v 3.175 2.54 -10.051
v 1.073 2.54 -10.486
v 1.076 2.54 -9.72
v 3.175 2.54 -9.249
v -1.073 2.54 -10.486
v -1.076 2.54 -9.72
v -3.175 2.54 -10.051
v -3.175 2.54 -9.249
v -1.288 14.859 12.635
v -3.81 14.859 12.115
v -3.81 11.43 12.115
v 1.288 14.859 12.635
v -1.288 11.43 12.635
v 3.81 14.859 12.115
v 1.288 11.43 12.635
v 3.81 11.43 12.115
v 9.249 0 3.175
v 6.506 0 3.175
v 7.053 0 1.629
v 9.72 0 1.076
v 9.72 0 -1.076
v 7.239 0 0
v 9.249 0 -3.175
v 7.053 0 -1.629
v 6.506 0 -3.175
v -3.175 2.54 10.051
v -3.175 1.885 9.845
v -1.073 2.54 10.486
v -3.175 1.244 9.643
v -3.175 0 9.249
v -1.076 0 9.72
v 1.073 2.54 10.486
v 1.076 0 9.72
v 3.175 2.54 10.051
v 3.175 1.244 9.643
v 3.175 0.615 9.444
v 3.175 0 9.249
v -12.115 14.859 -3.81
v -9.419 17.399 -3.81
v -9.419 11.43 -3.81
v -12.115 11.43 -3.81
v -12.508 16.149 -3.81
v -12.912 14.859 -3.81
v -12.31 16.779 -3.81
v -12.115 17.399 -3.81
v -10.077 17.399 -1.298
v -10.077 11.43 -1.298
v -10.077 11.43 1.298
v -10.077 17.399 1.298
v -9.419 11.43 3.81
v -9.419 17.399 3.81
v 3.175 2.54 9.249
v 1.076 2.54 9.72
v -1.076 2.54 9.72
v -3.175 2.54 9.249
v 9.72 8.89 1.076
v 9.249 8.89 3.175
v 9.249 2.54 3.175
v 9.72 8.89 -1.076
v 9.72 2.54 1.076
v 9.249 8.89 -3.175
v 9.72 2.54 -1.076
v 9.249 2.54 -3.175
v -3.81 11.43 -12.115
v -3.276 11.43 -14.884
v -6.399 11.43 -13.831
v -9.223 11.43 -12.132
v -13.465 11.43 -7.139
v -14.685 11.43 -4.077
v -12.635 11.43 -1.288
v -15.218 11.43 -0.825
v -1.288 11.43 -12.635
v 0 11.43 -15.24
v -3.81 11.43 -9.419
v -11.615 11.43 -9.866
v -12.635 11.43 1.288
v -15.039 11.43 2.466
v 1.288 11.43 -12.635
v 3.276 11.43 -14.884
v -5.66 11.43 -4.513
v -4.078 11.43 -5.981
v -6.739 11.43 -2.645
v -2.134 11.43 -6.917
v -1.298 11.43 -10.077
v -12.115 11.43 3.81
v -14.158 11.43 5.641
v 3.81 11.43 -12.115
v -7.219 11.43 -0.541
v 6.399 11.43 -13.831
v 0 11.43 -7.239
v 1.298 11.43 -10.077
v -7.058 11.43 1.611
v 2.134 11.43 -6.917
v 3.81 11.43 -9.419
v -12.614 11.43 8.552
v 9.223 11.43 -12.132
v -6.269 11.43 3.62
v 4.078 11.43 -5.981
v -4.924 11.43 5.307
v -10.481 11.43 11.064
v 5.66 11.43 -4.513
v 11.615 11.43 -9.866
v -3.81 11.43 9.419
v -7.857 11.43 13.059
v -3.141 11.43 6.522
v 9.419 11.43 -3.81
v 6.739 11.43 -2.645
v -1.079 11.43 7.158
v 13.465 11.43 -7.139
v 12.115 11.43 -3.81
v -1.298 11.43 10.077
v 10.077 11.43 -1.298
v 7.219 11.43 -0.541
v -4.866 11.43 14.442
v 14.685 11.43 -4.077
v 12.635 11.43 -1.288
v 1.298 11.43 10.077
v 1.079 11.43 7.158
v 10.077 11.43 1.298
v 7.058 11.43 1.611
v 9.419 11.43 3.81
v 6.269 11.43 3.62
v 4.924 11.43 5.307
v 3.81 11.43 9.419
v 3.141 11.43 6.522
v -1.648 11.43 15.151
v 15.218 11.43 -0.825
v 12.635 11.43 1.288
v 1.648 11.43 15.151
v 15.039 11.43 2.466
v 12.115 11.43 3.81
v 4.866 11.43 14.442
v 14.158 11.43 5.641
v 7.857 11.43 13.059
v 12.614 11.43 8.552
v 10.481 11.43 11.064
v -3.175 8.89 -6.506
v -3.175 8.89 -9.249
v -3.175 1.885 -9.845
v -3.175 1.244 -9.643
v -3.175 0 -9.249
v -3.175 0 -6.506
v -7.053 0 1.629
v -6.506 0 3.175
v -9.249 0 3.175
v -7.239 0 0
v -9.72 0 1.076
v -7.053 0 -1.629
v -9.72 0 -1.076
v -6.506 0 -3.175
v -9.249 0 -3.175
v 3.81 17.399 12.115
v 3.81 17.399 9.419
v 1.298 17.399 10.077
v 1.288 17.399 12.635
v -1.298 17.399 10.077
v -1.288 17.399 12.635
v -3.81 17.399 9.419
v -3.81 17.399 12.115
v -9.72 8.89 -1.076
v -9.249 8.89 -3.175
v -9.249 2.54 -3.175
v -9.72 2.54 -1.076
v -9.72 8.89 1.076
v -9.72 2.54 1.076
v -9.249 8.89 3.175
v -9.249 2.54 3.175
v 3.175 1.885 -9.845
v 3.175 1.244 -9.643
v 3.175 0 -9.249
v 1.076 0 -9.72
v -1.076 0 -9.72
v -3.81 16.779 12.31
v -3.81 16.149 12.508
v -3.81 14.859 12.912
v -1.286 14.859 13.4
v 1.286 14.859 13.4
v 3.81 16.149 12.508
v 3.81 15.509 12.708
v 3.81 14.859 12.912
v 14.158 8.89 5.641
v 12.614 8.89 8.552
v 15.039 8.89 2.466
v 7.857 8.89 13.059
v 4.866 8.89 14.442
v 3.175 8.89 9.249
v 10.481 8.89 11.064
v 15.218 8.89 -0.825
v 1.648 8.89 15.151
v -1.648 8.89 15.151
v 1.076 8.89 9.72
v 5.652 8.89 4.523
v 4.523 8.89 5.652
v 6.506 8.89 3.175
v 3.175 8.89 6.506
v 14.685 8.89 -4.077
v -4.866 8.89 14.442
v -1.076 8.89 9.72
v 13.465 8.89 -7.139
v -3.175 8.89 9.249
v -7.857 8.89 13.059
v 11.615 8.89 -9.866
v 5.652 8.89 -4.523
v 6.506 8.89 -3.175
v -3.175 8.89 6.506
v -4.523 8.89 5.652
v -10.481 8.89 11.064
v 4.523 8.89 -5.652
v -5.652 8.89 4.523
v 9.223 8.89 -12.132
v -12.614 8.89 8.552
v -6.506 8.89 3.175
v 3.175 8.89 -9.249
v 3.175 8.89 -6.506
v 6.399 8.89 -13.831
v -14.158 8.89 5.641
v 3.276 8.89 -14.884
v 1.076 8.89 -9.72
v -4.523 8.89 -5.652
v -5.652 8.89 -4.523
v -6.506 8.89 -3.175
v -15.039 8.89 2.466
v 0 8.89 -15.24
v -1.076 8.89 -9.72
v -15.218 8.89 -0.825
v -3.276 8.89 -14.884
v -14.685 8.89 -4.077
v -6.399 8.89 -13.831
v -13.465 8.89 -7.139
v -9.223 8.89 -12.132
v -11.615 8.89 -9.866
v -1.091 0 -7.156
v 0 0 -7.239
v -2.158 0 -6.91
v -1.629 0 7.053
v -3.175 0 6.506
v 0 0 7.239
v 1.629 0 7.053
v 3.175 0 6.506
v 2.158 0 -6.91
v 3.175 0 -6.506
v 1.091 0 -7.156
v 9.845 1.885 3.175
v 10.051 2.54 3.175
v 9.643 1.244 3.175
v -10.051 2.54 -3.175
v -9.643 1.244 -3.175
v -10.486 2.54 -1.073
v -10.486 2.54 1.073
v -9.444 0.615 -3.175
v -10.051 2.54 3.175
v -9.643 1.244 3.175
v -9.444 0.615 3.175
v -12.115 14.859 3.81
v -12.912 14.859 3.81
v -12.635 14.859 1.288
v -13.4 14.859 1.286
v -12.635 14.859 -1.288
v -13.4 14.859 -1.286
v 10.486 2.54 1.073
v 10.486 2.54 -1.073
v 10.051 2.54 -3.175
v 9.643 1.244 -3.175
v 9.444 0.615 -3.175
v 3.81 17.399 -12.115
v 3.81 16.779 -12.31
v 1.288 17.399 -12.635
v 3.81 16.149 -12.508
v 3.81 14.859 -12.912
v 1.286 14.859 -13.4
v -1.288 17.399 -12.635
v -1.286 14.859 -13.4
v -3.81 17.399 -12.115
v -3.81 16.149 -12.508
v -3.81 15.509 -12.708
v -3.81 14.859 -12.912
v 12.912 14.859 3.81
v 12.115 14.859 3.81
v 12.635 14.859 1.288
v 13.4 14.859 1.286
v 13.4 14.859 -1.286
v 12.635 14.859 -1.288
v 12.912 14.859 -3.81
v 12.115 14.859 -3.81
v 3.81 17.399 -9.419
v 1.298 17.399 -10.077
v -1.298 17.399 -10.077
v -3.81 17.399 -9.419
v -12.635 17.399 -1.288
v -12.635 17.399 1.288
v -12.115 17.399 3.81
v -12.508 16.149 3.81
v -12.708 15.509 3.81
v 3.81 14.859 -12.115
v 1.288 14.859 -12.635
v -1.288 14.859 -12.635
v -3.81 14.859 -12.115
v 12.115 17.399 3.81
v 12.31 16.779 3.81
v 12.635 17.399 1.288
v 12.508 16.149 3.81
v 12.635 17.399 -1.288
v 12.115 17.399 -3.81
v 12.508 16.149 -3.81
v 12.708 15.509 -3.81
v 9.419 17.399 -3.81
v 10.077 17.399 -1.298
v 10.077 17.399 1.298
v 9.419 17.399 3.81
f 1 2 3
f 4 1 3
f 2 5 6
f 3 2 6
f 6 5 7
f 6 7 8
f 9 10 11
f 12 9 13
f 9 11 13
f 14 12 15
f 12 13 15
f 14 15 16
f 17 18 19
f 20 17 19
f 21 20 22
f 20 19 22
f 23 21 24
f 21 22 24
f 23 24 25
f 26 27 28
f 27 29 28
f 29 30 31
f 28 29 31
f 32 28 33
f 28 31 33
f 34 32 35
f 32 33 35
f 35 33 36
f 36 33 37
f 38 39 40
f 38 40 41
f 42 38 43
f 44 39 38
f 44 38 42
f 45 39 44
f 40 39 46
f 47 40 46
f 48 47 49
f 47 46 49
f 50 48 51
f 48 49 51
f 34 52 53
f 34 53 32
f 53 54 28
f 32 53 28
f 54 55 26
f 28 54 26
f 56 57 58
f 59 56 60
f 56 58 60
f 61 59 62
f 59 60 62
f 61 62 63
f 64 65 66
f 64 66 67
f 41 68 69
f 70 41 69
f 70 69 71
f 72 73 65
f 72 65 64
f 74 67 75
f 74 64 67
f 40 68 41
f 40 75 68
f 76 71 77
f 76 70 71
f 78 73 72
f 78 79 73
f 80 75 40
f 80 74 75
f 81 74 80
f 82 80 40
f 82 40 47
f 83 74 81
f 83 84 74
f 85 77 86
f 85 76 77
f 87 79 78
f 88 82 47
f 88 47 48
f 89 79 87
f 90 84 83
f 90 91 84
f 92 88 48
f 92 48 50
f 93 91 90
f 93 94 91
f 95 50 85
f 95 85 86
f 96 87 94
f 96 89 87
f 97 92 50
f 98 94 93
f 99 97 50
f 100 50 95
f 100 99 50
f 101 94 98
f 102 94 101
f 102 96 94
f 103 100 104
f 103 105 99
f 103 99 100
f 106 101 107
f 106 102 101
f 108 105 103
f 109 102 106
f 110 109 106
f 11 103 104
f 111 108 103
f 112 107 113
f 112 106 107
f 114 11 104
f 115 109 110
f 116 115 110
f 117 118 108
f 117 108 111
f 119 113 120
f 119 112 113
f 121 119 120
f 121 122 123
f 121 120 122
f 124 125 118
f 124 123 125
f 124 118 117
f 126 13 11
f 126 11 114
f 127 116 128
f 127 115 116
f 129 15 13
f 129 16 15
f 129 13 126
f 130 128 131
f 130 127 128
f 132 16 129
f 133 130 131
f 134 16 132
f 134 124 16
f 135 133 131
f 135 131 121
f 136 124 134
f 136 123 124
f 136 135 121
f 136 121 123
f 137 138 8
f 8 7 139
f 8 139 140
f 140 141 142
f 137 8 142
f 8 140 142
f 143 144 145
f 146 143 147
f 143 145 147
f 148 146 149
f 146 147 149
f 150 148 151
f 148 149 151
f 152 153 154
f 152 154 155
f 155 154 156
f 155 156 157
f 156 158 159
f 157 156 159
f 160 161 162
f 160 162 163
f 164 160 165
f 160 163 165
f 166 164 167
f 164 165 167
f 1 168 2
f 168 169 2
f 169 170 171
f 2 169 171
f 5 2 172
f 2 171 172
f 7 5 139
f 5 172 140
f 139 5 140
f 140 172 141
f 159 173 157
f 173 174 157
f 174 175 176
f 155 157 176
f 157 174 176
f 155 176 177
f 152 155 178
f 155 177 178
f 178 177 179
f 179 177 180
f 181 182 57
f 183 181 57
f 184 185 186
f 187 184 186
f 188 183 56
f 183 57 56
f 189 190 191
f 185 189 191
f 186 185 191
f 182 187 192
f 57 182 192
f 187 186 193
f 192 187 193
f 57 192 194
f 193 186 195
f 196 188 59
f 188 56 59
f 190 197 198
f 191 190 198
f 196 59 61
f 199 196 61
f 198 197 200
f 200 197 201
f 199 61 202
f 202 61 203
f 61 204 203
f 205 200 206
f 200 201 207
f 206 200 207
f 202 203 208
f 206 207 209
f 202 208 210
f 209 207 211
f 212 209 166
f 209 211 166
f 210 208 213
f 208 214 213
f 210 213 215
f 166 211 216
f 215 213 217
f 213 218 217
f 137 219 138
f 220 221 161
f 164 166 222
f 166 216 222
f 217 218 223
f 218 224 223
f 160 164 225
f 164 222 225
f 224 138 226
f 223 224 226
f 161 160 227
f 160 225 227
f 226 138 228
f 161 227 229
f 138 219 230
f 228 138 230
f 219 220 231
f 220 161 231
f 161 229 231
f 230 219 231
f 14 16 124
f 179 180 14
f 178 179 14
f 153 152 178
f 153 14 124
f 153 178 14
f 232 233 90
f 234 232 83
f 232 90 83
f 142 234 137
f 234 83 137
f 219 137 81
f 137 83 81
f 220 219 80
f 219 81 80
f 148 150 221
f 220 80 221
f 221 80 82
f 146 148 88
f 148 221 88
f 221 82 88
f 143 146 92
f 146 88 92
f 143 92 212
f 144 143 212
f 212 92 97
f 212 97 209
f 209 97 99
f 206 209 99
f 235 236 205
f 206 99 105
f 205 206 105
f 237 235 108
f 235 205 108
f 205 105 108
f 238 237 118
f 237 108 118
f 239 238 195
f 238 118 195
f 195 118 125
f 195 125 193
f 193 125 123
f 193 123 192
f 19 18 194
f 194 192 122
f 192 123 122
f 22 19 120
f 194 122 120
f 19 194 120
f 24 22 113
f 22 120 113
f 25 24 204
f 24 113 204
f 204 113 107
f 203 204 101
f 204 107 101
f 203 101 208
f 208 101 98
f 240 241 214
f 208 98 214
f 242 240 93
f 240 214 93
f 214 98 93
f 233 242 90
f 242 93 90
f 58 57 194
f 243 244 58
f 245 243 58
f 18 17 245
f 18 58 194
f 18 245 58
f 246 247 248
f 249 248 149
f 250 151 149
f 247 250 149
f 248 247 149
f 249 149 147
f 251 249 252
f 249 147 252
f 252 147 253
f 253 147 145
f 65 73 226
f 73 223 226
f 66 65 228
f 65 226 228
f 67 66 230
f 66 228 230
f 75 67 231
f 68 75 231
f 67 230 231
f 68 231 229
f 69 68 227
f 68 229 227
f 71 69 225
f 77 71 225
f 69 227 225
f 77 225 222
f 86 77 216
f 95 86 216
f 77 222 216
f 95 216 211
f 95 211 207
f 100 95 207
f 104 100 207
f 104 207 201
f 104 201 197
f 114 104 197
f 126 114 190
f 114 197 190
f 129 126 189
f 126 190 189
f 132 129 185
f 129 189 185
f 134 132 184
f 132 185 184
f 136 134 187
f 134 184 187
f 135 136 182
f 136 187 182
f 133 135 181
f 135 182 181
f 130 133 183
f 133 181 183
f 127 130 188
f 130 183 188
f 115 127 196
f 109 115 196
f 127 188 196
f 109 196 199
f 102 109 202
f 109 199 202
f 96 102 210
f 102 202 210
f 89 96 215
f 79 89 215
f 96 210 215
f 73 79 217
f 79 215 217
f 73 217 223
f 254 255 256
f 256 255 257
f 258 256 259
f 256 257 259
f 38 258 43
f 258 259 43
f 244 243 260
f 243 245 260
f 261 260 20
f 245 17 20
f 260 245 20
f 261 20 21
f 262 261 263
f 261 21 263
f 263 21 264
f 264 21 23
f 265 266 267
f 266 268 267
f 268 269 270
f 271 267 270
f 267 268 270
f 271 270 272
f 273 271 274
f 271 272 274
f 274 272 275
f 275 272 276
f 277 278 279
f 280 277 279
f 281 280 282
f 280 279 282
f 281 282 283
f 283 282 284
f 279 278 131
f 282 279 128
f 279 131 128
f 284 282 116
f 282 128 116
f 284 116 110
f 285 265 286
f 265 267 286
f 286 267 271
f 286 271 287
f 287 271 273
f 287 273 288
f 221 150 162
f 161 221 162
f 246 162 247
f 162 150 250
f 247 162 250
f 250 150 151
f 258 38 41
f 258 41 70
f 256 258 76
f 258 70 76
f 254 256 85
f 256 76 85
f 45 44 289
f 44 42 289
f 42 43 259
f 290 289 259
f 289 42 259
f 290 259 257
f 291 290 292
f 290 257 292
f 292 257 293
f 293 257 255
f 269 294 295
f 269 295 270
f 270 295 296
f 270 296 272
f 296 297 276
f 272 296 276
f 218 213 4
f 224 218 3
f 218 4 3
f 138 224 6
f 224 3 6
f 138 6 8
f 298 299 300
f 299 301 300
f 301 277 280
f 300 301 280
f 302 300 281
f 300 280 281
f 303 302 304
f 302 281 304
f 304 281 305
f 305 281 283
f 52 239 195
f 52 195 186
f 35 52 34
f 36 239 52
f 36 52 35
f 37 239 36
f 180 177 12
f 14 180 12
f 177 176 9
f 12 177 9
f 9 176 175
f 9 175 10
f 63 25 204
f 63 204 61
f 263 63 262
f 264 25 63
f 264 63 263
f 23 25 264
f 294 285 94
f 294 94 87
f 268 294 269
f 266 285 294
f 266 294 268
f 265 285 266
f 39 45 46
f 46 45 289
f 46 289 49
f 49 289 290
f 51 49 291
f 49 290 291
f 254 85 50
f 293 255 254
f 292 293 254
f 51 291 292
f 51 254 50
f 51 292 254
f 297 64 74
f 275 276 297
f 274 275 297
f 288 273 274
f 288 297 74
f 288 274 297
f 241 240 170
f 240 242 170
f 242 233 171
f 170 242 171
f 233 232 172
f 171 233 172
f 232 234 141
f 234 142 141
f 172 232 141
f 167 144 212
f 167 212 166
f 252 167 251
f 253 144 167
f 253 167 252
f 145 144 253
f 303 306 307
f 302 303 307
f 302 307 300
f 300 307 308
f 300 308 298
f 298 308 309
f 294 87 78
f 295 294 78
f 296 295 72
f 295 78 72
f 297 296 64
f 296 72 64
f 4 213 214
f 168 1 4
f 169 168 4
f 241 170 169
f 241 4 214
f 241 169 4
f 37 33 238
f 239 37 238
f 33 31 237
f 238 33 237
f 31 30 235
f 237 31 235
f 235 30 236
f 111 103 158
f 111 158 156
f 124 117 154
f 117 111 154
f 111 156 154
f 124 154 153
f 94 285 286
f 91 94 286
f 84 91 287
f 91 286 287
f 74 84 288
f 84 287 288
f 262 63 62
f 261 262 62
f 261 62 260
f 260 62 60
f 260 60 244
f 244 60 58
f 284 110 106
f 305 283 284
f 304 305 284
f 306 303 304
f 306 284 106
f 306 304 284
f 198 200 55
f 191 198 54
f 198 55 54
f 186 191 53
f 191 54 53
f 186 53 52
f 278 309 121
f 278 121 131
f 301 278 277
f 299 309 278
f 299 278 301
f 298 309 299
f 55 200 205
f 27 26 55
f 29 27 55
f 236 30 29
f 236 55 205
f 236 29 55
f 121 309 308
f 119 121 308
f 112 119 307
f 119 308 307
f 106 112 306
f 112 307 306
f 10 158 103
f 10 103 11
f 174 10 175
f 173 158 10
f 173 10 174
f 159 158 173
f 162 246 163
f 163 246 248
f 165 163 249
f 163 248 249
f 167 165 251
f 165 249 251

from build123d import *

# Parameters (mm, degrees)
CUT_EXTRUDE1_REACH = 29.699
CUT_EXTRUDE2_REACH = 29.699


with BuildPart() as part:
    # Sketch1 → Revolve1 (revolve)
    with BuildSketch(Plane.XY, mode=Mode.PRIVATE) as revolve1_sk:
        Polygon((12.7, 17.399), (13.462, 14.859), (12.7, 14.859), (12.7, 11.43), (15.24, 11.43), (15.24, 8.89), (9.779, 8.89), (9.779, 2.54), (10.541, 2.54), (9.779, 0), (7.239, 0), (7.239, 11.43), (10.16, 11.43), (10.16, 17.399), align=None)
    revolve(revolve1_sk.sketch.rotate(Axis((0, 0, 0), (0, 1, 0)), 90), axis=Axis((0, 0, 0), (0, 1, 0)))

    # Cut-Extrude1: up to this face of the body (flat: up to its plane)
    cut_extrude1_end = Plane(part.part.faces().sort_by_distance((0, 11.43, 13.131052294))[0])
    # Sketch2 → Cut-Extrude1 (cut, up to the picked face)
    with BuildSketch(Plane(origin=(0, 17.399, 0), x_dir=(1, 0, 0), z_dir=(0, 1, 0)), mode=Mode.PRIVATE) as cut_extrude1_sk1:
        with BuildLine():
            Line((-9.418572079, 3.81), (-12.911597268, 3.81))
            ThreePointArc((-12.911597268, 3.81), (-9.519071488, 9.519071488), (-3.81, 12.911597268))
            Line((-3.81, 12.911597268), (-3.81, 9.418572079))
            ThreePointArc((-3.81, 9.418572079), (-7.184204897, 7.184204897), (-9.418572079, 3.81))
        make_face()
    cut_extrude1_tool1 = split(extrude(cut_extrude1_sk1.sketch, amount=-CUT_EXTRUDE1_REACH, mode=Mode.PRIVATE), bisect_by=cut_extrude1_end, keep=Keep.BOTH, mode=Mode.PRIVATE)
    # Sketch2 → Cut-Extrude1 (cut, up to the picked face)
    with BuildSketch(Plane(origin=(0, 17.399, 0), x_dir=(1, 0, 0), z_dir=(0, 1, 0)), mode=Mode.PRIVATE) as cut_extrude1_sk2:
        with BuildLine():
            Line((-12.911597268, -3.81), (-9.418572079, -3.81))
            ThreePointArc((-9.418572079, -3.81), (-7.184204897, -7.184204897), (-3.81, -9.418572079))
            Line((-3.81, -9.418572079), (-3.81, -12.911597268))
            ThreePointArc((-3.81, -12.911597268), (-9.519071488, -9.519071488), (-12.911597268, -3.81))
        make_face()
    cut_extrude1_tool2 = split(extrude(cut_extrude1_sk2.sketch, amount=-CUT_EXTRUDE1_REACH, mode=Mode.PRIVATE), bisect_by=cut_extrude1_end, keep=Keep.BOTH, mode=Mode.PRIVATE)
    # Sketch2 → Cut-Extrude1 (cut, up to the picked face)
    with BuildSketch(Plane(origin=(0, 17.399, 0), x_dir=(1, 0, 0), z_dir=(0, 1, 0)), mode=Mode.PRIVATE) as cut_extrude1_sk3:
        with BuildLine():
            Line((3.81, 9.418572079), (3.81, 12.911597268))
            ThreePointArc((3.81, 12.911597268), (9.519071488, 9.519071488), (12.911597268, 3.81))
            Line((12.911597268, 3.81), (9.418572079, 3.81))
            ThreePointArc((9.418572079, 3.81), (7.184204897, 7.184204897), (3.81, 9.418572079))
        make_face()
    cut_extrude1_tool3 = split(extrude(cut_extrude1_sk3.sketch, amount=-CUT_EXTRUDE1_REACH, mode=Mode.PRIVATE), bisect_by=cut_extrude1_end, keep=Keep.BOTH, mode=Mode.PRIVATE)
    # Sketch2 → Cut-Extrude1 (cut, up to the picked face)
    with BuildSketch(Plane(origin=(0, 17.399, 0), x_dir=(1, 0, 0), z_dir=(0, 1, 0)), mode=Mode.PRIVATE) as cut_extrude1_sk4:
        with BuildLine():
            Line((9.418572079, -3.81), (12.911597268, -3.81))
            ThreePointArc((12.911597268, -3.81), (9.519071488, -9.519071488), (3.81, -12.911597268))
            Line((3.81, -12.911597268), (3.81, -9.418572079))
            ThreePointArc((3.81, -9.418572079), (7.184204897, -7.184204897), (9.418572079, -3.81))
        make_face()
    cut_extrude1_tool4 = split(extrude(cut_extrude1_sk4.sketch, amount=-CUT_EXTRUDE1_REACH, mode=Mode.PRIVATE), bisect_by=cut_extrude1_end, keep=Keep.BOTH, mode=Mode.PRIVATE)
    add(cut_extrude1_tool1.solids().sort_by(Axis((-8.150135, 17.399, -8.150135), (0, -1, 0)))[0], mode=Mode.SUBTRACT)
    add(cut_extrude1_tool2.solids().sort_by(Axis((-8.150135, 17.399, 8.150135), (0, -1, 0)))[0], mode=Mode.SUBTRACT)
    add(cut_extrude1_tool3.solids().sort_by(Axis((8.150135, 17.399, -8.150135), (0, -1, 0)))[0], mode=Mode.SUBTRACT)
    add(cut_extrude1_tool4.solids().sort_by(Axis((8.150135, 17.399, 8.150135), (0, -1, 0)))[0], mode=Mode.SUBTRACT)

    # Cut-Extrude2: up to this face of the body (flat: up to its plane)
    cut_extrude2_end = Plane(part.part.faces().sort_by_distance((0, 8.89, 14.808947706))[0])
    # Sketch3 → Cut-Extrude2 (cut, up to the picked face)
    with BuildSketch(Plane.XZ, mode=Mode.PRIVATE) as cut_extrude2_sk1:
        with BuildLine():
            Line((-6.505574225, 3.175), (-10.05147034, 3.175))
            ThreePointArc((-10.05147034, 3.175), (-7.45361258, 7.45361258), (-3.175, 10.05147034))
            Line((-3.175, 10.05147034), (-3.175, 6.505574225))
            ThreePointArc((-3.175, 6.505574225), (-5.118745989, 5.118745989), (-6.505574225, 3.175))
        make_face()
    cut_extrude2_tool1 = split(extrude(cut_extrude2_sk1.sketch, amount=-CUT_EXTRUDE2_REACH, mode=Mode.PRIVATE), bisect_by=cut_extrude2_end, keep=Keep.BOTH, mode=Mode.PRIVATE)
    # Sketch3 → Cut-Extrude2 (cut, up to the picked face)
    with BuildSketch(Plane.XZ, mode=Mode.PRIVATE) as cut_extrude2_sk2:
        with BuildLine():
            Line((-6.505574225, -3.175), (-10.05147034, -3.175))
            ThreePointArc((-10.05147034, -3.175), (-7.45361258, -7.45361258), (-3.175, -10.05147034))
            Line((-3.175, -10.05147034), (-3.175, -6.505574225))
            ThreePointArc((-3.175, -6.505574225), (-5.118745989, -5.118745989), (-6.505574225, -3.175))
        make_face()
    cut_extrude2_tool2 = split(extrude(cut_extrude2_sk2.sketch, amount=-CUT_EXTRUDE2_REACH, mode=Mode.PRIVATE), bisect_by=cut_extrude2_end, keep=Keep.BOTH, mode=Mode.PRIVATE)
    # Sketch3 → Cut-Extrude2 (cut, up to the picked face)
    with BuildSketch(Plane.XZ, mode=Mode.PRIVATE) as cut_extrude2_sk3:
        with BuildLine():
            Line((3.175, 6.505574225), (3.175, 10.05147034))
            ThreePointArc((3.175, 10.05147034), (7.45361258, 7.45361258), (10.05147034, 3.175))
            Line((10.05147034, 3.175), (6.505574225, 3.175))
            ThreePointArc((6.505574225, 3.175), (5.118745989, 5.118745989), (3.175, 6.505574225))
        make_face()
    cut_extrude2_tool3 = split(extrude(cut_extrude2_sk3.sketch, amount=-CUT_EXTRUDE2_REACH, mode=Mode.PRIVATE), bisect_by=cut_extrude2_end, keep=Keep.BOTH, mode=Mode.PRIVATE)
    # Sketch3 → Cut-Extrude2 (cut, up to the picked face)
    with BuildSketch(Plane.XZ, mode=Mode.PRIVATE) as cut_extrude2_sk4:
        with BuildLine():
            Line((6.505574225, -3.175), (10.05147034, -3.175))
            ThreePointArc((10.05147034, -3.175), (7.45361258, -7.45361258), (3.175, -10.05147034))
            Line((3.175, -10.05147034), (3.175, -6.505574225))
            ThreePointArc((3.175, -6.505574225), (5.118745989, -5.118745989), (6.505574225, -3.175))
        make_face()
    cut_extrude2_tool4 = split(extrude(cut_extrude2_sk4.sketch, amount=-CUT_EXTRUDE2_REACH, mode=Mode.PRIVATE), bisect_by=cut_extrude2_end, keep=Keep.BOTH, mode=Mode.PRIVATE)
    add(cut_extrude2_tool1.solids().sort_by(Axis((-6.228446, 0, 6.228446), (0, 1, 0)))[0], mode=Mode.SUBTRACT)
    add(cut_extrude2_tool2.solids().sort_by(Axis((-6.228446, 0, -6.228446), (0, 1, 0)))[0], mode=Mode.SUBTRACT)
    add(cut_extrude2_tool3.solids().sort_by(Axis((6.228446, 0, 6.228446), (0, 1, 0)))[0], mode=Mode.SUBTRACT)
    add(cut_extrude2_tool4.solids().sort_by(Axis((6.228446, 0, -6.228446), (0, 1, 0)))[0], mode=Mode.SUBTRACT)


solid = part.part
